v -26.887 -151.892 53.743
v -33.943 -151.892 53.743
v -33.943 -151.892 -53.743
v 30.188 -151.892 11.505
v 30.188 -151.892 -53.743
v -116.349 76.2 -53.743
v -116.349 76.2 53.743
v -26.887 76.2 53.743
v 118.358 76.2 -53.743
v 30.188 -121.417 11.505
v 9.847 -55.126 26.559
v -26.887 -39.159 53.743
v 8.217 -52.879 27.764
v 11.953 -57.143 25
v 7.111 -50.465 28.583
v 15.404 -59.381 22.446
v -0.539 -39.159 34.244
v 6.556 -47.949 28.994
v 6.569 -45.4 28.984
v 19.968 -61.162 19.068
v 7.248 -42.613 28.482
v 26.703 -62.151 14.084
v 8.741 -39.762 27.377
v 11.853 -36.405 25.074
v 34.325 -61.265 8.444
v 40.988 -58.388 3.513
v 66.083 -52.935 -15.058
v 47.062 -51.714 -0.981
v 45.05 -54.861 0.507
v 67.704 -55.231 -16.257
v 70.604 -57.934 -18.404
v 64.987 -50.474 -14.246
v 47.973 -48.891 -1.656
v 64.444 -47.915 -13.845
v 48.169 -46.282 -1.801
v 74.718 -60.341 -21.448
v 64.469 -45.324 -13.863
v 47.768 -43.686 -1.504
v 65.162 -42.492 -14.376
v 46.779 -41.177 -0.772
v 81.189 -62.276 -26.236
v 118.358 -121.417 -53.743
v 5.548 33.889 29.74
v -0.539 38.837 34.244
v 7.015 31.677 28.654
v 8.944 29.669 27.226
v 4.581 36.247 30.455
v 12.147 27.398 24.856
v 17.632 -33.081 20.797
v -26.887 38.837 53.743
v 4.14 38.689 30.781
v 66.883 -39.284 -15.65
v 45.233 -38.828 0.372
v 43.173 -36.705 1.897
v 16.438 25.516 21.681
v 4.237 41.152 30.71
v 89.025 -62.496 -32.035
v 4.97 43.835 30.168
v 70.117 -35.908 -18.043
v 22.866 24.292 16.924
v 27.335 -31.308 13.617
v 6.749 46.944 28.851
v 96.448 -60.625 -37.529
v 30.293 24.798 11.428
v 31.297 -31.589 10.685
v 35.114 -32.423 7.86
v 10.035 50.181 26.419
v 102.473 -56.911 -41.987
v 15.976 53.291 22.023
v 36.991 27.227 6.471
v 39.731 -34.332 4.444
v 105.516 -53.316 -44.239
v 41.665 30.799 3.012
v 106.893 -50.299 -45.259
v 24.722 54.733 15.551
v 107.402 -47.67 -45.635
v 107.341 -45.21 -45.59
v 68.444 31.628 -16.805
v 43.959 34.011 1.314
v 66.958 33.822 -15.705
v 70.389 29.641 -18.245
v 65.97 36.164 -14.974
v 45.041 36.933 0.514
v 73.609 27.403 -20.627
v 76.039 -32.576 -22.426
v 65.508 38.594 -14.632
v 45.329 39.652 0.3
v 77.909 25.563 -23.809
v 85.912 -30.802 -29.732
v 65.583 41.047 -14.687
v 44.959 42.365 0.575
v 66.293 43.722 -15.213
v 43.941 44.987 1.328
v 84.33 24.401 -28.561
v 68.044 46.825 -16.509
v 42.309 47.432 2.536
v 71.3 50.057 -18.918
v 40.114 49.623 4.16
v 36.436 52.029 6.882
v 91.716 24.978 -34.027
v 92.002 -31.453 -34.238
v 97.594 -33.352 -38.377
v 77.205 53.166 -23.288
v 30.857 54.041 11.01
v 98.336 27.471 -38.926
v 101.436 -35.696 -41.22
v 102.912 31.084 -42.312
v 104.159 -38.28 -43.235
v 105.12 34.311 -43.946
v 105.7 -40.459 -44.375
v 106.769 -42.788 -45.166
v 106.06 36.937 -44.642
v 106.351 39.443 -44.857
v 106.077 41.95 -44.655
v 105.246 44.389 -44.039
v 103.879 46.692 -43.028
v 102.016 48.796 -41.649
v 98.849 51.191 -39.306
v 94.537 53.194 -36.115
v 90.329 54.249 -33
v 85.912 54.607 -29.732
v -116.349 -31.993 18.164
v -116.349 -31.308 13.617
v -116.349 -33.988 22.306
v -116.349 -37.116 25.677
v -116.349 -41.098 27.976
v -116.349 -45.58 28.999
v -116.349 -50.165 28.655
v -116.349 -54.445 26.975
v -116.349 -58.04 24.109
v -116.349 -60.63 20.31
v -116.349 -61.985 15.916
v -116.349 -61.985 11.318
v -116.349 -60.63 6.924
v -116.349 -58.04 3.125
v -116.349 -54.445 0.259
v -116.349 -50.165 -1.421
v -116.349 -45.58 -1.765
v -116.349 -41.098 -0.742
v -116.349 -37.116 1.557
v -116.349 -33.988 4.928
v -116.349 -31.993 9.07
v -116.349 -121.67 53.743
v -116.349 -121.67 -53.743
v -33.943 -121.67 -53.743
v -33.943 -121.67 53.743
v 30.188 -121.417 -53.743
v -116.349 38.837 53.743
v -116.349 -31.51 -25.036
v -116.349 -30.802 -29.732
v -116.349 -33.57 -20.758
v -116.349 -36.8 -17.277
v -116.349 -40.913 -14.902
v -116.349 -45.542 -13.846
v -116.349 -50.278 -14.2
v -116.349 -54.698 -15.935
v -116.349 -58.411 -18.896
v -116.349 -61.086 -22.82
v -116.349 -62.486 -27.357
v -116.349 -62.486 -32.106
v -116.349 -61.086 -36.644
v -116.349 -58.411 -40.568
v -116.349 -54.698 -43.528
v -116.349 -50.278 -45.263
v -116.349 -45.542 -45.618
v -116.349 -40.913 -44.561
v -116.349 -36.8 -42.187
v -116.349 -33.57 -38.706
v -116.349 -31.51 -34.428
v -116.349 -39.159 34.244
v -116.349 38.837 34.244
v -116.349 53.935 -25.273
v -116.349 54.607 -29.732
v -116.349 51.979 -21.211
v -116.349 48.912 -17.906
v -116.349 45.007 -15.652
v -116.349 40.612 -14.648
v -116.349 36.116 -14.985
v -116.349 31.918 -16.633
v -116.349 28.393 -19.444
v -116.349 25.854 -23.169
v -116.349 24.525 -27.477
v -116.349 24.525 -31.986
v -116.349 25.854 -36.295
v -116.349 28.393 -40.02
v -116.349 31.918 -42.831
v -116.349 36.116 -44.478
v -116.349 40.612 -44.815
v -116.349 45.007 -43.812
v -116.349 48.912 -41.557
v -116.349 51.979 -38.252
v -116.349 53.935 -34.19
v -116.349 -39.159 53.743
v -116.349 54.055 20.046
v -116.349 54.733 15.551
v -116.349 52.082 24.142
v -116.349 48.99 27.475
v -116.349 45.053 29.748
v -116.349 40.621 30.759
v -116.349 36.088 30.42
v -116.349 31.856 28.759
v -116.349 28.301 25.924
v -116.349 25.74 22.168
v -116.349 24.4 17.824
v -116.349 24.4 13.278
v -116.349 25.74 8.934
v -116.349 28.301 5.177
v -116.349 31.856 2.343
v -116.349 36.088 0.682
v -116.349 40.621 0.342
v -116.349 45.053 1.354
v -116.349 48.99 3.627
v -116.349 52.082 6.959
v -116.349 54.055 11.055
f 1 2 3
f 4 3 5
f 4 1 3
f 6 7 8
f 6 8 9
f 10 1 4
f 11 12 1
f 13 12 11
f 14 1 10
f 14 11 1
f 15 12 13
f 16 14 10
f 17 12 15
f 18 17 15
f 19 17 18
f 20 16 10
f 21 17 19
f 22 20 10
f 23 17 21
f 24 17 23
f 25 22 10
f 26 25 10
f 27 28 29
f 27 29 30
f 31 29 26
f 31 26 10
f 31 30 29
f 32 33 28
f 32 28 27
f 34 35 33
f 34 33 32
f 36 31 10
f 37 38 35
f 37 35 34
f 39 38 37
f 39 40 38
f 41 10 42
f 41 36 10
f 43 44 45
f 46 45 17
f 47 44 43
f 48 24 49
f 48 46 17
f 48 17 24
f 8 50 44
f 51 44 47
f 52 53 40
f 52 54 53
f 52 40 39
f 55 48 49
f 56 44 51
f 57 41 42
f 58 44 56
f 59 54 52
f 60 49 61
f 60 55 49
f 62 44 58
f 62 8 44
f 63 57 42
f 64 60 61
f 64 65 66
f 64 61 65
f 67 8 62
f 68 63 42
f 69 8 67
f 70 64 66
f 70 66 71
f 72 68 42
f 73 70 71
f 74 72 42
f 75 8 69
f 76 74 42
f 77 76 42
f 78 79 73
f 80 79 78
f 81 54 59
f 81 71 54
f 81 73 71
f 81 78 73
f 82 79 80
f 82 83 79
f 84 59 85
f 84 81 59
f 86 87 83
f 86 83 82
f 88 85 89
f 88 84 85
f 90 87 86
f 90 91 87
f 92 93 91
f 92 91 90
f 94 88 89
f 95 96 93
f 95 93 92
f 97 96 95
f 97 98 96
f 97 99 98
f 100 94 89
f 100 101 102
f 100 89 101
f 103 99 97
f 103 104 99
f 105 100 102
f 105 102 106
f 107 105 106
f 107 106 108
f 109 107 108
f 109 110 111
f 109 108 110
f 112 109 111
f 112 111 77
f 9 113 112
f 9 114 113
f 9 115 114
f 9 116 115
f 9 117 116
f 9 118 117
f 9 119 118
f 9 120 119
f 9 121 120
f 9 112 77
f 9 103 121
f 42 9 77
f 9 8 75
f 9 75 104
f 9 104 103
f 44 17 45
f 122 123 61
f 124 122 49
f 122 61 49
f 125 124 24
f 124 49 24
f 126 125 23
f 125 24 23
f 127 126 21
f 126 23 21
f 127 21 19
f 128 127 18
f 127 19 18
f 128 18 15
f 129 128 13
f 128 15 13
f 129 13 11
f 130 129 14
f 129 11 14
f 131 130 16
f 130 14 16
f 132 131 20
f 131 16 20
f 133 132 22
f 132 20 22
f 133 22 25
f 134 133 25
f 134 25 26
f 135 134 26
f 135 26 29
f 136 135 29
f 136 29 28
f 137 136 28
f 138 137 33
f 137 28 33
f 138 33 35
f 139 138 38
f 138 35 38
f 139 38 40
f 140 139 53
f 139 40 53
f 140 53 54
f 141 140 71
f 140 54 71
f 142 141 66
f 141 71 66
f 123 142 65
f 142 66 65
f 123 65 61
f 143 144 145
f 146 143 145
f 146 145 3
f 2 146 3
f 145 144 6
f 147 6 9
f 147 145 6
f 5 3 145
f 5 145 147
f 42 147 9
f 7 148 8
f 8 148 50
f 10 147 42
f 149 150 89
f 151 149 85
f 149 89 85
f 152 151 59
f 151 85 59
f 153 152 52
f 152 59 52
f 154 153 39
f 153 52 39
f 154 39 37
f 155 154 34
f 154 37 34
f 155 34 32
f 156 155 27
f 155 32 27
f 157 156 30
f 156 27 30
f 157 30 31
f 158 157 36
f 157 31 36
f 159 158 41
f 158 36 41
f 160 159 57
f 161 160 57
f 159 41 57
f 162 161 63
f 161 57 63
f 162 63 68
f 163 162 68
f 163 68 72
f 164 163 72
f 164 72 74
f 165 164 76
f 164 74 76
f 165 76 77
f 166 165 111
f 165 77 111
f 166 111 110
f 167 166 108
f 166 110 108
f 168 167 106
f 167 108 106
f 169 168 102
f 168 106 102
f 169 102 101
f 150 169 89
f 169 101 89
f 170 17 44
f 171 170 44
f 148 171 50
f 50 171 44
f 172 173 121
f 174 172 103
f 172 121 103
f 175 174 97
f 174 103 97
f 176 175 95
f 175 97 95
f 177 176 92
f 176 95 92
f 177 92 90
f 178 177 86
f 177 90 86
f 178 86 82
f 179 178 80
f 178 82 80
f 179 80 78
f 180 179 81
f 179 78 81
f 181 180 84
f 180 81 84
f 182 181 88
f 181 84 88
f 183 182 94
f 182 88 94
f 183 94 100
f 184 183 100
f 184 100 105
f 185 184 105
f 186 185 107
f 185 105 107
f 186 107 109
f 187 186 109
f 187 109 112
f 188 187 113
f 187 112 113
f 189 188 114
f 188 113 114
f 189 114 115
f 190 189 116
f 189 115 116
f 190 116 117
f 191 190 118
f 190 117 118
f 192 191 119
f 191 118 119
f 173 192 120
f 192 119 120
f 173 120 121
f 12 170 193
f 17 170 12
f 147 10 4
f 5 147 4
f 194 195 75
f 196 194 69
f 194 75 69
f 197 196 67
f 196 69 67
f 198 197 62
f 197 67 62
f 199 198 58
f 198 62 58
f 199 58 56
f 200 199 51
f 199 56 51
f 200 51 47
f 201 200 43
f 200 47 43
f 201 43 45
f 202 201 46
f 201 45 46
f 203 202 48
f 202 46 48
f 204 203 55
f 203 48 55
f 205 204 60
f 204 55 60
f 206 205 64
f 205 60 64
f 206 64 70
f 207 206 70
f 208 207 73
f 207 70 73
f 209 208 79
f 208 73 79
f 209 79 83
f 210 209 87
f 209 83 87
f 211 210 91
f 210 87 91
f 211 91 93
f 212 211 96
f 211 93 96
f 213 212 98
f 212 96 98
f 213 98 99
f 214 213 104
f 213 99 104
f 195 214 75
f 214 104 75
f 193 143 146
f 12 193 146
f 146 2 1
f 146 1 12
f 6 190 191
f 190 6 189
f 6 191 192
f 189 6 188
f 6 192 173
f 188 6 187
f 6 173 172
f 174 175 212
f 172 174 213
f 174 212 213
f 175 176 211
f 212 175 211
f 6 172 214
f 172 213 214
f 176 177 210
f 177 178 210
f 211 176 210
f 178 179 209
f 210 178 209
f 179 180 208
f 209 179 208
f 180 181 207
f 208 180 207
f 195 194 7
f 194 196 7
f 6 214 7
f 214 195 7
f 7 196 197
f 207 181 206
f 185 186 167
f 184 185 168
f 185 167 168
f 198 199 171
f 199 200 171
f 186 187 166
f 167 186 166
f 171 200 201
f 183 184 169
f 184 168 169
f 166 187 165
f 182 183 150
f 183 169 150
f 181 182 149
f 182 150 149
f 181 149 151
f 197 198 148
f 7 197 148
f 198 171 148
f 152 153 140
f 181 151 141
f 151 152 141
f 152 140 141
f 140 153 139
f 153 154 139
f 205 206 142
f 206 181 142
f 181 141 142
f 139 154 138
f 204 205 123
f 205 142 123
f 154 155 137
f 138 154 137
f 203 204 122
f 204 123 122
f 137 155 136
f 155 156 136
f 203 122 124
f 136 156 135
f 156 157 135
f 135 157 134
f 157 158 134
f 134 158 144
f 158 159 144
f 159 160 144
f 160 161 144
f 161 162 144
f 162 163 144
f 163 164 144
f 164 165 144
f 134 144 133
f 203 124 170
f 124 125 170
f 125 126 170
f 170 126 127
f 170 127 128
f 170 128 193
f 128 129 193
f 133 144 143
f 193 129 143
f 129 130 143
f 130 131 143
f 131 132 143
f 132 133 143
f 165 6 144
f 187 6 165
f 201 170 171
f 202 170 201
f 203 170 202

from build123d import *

# Parameters (mm, degrees)
F0_W          = 235.2761279326
F0_H          = 107.4857413769
F1_DEPTH      = 151.892
F1_DEPTH_BACK = 76.2
F3_DEPTH      = 237.236
F3_DEPTH_BACK = 76.2
F4_W          = 77.9956504703
F4_H          = 36.5806035697
F5_DEPTH      = 158.242
F6_R          = 15.4248239937
F6_R_2        = 15.9308513278
F6_R_3        = 15.1256103557
F6_R_4        = 15.251280461
F7_DEPTH      = 184.658
F7_DEPTH_BACK = 146.812
F8_W          = 88.170285026
F8_H          = 30.4754237933
F9_DEPTH      = 160.528
F10_W         = 82.4058901053
F10_H         = 30.2224318786
F11_DEPTH     = 127.762


with BuildPart() as f1:
    # F0 (on Front) → F1 (new body, two sides)
    with BuildSketch(Plane.XZ) as f1_sk:
        with Locations((1.289183856, 0)):
            Rectangle(F0_W, F0_H)
    extrude(amount=F1_DEPTH)
    extrude(f1_sk.sketch, amount=-F1_DEPTH_BACK)

    # F2 (on Front) → F3 (cut, two sides)
    with BuildSketch(Plane.XZ) as f3_sk:
        Polygon((126.138061285, 57.2444498539), (-31.619194895, 57.2444498539), (126.138061285, -59.499990195), align=None)
    extrude(amount=F3_DEPTH, mode=Mode.SUBTRACT)
    extrude(f3_sk.sketch, amount=-F3_DEPTH_BACK, mode=Mode.SUBTRACT)

    # F4 (on Right) → F5 (cut)
    with BuildSketch(Plane.YZ):
        with Locations((-0.1611486077, 52.5342617184)):
            Rectangle(F4_W, F4_H)
    extrude(amount=-F5_DEPTH, mode=Mode.SUBTRACT)

    # F6 (on Right) → F7 (cut, two sides)
    with BuildSketch(Plane.YZ) as f7_sk:
        with Locations((-46.7329323292, 13.6170089245)):
            Circle(F6_R)
        with Locations((-46.7329323292, -29.7318119556)):
            Circle(F6_R_2)
        with Locations((39.4812710583, -29.7318119556)):
            Circle(F6_R_3)
        with Locations((39.4812710583, 15.550785698)):
            Circle(F6_R_4)
    extrude(amount=-F7_DEPTH, mode=Mode.SUBTRACT)
    extrude(f7_sk.sketch, amount=F7_DEPTH_BACK, mode=Mode.SUBTRACT)

    # F8 (on face) → F9 (cut)
    with BuildSketch(Plane(origin=(0, 0, -53.7428706884), x_dir=(1, 0, 0), z_dir=(0, 0, -1))):
        with Locations((74.2732988048, 136.6542881033)):
            Rectangle(F8_W, F8_H)
    extrude(amount=-F9_DEPTH, mode=Mode.SUBTRACT)

    # F10 (on face) → F11 (cut)
    with BuildSketch(Plane(origin=(0, 0, -53.7428706884), x_dir=(1, 0, 0), z_dir=(0, 0, -1))):
        with Locations((-75.1459350577, 136.7807840607)):
            Rectangle(F10_W, F10_H)
    extrude(amount=-F11_DEPTH, mode=Mode.SUBTRACT)


solid = f1.part
